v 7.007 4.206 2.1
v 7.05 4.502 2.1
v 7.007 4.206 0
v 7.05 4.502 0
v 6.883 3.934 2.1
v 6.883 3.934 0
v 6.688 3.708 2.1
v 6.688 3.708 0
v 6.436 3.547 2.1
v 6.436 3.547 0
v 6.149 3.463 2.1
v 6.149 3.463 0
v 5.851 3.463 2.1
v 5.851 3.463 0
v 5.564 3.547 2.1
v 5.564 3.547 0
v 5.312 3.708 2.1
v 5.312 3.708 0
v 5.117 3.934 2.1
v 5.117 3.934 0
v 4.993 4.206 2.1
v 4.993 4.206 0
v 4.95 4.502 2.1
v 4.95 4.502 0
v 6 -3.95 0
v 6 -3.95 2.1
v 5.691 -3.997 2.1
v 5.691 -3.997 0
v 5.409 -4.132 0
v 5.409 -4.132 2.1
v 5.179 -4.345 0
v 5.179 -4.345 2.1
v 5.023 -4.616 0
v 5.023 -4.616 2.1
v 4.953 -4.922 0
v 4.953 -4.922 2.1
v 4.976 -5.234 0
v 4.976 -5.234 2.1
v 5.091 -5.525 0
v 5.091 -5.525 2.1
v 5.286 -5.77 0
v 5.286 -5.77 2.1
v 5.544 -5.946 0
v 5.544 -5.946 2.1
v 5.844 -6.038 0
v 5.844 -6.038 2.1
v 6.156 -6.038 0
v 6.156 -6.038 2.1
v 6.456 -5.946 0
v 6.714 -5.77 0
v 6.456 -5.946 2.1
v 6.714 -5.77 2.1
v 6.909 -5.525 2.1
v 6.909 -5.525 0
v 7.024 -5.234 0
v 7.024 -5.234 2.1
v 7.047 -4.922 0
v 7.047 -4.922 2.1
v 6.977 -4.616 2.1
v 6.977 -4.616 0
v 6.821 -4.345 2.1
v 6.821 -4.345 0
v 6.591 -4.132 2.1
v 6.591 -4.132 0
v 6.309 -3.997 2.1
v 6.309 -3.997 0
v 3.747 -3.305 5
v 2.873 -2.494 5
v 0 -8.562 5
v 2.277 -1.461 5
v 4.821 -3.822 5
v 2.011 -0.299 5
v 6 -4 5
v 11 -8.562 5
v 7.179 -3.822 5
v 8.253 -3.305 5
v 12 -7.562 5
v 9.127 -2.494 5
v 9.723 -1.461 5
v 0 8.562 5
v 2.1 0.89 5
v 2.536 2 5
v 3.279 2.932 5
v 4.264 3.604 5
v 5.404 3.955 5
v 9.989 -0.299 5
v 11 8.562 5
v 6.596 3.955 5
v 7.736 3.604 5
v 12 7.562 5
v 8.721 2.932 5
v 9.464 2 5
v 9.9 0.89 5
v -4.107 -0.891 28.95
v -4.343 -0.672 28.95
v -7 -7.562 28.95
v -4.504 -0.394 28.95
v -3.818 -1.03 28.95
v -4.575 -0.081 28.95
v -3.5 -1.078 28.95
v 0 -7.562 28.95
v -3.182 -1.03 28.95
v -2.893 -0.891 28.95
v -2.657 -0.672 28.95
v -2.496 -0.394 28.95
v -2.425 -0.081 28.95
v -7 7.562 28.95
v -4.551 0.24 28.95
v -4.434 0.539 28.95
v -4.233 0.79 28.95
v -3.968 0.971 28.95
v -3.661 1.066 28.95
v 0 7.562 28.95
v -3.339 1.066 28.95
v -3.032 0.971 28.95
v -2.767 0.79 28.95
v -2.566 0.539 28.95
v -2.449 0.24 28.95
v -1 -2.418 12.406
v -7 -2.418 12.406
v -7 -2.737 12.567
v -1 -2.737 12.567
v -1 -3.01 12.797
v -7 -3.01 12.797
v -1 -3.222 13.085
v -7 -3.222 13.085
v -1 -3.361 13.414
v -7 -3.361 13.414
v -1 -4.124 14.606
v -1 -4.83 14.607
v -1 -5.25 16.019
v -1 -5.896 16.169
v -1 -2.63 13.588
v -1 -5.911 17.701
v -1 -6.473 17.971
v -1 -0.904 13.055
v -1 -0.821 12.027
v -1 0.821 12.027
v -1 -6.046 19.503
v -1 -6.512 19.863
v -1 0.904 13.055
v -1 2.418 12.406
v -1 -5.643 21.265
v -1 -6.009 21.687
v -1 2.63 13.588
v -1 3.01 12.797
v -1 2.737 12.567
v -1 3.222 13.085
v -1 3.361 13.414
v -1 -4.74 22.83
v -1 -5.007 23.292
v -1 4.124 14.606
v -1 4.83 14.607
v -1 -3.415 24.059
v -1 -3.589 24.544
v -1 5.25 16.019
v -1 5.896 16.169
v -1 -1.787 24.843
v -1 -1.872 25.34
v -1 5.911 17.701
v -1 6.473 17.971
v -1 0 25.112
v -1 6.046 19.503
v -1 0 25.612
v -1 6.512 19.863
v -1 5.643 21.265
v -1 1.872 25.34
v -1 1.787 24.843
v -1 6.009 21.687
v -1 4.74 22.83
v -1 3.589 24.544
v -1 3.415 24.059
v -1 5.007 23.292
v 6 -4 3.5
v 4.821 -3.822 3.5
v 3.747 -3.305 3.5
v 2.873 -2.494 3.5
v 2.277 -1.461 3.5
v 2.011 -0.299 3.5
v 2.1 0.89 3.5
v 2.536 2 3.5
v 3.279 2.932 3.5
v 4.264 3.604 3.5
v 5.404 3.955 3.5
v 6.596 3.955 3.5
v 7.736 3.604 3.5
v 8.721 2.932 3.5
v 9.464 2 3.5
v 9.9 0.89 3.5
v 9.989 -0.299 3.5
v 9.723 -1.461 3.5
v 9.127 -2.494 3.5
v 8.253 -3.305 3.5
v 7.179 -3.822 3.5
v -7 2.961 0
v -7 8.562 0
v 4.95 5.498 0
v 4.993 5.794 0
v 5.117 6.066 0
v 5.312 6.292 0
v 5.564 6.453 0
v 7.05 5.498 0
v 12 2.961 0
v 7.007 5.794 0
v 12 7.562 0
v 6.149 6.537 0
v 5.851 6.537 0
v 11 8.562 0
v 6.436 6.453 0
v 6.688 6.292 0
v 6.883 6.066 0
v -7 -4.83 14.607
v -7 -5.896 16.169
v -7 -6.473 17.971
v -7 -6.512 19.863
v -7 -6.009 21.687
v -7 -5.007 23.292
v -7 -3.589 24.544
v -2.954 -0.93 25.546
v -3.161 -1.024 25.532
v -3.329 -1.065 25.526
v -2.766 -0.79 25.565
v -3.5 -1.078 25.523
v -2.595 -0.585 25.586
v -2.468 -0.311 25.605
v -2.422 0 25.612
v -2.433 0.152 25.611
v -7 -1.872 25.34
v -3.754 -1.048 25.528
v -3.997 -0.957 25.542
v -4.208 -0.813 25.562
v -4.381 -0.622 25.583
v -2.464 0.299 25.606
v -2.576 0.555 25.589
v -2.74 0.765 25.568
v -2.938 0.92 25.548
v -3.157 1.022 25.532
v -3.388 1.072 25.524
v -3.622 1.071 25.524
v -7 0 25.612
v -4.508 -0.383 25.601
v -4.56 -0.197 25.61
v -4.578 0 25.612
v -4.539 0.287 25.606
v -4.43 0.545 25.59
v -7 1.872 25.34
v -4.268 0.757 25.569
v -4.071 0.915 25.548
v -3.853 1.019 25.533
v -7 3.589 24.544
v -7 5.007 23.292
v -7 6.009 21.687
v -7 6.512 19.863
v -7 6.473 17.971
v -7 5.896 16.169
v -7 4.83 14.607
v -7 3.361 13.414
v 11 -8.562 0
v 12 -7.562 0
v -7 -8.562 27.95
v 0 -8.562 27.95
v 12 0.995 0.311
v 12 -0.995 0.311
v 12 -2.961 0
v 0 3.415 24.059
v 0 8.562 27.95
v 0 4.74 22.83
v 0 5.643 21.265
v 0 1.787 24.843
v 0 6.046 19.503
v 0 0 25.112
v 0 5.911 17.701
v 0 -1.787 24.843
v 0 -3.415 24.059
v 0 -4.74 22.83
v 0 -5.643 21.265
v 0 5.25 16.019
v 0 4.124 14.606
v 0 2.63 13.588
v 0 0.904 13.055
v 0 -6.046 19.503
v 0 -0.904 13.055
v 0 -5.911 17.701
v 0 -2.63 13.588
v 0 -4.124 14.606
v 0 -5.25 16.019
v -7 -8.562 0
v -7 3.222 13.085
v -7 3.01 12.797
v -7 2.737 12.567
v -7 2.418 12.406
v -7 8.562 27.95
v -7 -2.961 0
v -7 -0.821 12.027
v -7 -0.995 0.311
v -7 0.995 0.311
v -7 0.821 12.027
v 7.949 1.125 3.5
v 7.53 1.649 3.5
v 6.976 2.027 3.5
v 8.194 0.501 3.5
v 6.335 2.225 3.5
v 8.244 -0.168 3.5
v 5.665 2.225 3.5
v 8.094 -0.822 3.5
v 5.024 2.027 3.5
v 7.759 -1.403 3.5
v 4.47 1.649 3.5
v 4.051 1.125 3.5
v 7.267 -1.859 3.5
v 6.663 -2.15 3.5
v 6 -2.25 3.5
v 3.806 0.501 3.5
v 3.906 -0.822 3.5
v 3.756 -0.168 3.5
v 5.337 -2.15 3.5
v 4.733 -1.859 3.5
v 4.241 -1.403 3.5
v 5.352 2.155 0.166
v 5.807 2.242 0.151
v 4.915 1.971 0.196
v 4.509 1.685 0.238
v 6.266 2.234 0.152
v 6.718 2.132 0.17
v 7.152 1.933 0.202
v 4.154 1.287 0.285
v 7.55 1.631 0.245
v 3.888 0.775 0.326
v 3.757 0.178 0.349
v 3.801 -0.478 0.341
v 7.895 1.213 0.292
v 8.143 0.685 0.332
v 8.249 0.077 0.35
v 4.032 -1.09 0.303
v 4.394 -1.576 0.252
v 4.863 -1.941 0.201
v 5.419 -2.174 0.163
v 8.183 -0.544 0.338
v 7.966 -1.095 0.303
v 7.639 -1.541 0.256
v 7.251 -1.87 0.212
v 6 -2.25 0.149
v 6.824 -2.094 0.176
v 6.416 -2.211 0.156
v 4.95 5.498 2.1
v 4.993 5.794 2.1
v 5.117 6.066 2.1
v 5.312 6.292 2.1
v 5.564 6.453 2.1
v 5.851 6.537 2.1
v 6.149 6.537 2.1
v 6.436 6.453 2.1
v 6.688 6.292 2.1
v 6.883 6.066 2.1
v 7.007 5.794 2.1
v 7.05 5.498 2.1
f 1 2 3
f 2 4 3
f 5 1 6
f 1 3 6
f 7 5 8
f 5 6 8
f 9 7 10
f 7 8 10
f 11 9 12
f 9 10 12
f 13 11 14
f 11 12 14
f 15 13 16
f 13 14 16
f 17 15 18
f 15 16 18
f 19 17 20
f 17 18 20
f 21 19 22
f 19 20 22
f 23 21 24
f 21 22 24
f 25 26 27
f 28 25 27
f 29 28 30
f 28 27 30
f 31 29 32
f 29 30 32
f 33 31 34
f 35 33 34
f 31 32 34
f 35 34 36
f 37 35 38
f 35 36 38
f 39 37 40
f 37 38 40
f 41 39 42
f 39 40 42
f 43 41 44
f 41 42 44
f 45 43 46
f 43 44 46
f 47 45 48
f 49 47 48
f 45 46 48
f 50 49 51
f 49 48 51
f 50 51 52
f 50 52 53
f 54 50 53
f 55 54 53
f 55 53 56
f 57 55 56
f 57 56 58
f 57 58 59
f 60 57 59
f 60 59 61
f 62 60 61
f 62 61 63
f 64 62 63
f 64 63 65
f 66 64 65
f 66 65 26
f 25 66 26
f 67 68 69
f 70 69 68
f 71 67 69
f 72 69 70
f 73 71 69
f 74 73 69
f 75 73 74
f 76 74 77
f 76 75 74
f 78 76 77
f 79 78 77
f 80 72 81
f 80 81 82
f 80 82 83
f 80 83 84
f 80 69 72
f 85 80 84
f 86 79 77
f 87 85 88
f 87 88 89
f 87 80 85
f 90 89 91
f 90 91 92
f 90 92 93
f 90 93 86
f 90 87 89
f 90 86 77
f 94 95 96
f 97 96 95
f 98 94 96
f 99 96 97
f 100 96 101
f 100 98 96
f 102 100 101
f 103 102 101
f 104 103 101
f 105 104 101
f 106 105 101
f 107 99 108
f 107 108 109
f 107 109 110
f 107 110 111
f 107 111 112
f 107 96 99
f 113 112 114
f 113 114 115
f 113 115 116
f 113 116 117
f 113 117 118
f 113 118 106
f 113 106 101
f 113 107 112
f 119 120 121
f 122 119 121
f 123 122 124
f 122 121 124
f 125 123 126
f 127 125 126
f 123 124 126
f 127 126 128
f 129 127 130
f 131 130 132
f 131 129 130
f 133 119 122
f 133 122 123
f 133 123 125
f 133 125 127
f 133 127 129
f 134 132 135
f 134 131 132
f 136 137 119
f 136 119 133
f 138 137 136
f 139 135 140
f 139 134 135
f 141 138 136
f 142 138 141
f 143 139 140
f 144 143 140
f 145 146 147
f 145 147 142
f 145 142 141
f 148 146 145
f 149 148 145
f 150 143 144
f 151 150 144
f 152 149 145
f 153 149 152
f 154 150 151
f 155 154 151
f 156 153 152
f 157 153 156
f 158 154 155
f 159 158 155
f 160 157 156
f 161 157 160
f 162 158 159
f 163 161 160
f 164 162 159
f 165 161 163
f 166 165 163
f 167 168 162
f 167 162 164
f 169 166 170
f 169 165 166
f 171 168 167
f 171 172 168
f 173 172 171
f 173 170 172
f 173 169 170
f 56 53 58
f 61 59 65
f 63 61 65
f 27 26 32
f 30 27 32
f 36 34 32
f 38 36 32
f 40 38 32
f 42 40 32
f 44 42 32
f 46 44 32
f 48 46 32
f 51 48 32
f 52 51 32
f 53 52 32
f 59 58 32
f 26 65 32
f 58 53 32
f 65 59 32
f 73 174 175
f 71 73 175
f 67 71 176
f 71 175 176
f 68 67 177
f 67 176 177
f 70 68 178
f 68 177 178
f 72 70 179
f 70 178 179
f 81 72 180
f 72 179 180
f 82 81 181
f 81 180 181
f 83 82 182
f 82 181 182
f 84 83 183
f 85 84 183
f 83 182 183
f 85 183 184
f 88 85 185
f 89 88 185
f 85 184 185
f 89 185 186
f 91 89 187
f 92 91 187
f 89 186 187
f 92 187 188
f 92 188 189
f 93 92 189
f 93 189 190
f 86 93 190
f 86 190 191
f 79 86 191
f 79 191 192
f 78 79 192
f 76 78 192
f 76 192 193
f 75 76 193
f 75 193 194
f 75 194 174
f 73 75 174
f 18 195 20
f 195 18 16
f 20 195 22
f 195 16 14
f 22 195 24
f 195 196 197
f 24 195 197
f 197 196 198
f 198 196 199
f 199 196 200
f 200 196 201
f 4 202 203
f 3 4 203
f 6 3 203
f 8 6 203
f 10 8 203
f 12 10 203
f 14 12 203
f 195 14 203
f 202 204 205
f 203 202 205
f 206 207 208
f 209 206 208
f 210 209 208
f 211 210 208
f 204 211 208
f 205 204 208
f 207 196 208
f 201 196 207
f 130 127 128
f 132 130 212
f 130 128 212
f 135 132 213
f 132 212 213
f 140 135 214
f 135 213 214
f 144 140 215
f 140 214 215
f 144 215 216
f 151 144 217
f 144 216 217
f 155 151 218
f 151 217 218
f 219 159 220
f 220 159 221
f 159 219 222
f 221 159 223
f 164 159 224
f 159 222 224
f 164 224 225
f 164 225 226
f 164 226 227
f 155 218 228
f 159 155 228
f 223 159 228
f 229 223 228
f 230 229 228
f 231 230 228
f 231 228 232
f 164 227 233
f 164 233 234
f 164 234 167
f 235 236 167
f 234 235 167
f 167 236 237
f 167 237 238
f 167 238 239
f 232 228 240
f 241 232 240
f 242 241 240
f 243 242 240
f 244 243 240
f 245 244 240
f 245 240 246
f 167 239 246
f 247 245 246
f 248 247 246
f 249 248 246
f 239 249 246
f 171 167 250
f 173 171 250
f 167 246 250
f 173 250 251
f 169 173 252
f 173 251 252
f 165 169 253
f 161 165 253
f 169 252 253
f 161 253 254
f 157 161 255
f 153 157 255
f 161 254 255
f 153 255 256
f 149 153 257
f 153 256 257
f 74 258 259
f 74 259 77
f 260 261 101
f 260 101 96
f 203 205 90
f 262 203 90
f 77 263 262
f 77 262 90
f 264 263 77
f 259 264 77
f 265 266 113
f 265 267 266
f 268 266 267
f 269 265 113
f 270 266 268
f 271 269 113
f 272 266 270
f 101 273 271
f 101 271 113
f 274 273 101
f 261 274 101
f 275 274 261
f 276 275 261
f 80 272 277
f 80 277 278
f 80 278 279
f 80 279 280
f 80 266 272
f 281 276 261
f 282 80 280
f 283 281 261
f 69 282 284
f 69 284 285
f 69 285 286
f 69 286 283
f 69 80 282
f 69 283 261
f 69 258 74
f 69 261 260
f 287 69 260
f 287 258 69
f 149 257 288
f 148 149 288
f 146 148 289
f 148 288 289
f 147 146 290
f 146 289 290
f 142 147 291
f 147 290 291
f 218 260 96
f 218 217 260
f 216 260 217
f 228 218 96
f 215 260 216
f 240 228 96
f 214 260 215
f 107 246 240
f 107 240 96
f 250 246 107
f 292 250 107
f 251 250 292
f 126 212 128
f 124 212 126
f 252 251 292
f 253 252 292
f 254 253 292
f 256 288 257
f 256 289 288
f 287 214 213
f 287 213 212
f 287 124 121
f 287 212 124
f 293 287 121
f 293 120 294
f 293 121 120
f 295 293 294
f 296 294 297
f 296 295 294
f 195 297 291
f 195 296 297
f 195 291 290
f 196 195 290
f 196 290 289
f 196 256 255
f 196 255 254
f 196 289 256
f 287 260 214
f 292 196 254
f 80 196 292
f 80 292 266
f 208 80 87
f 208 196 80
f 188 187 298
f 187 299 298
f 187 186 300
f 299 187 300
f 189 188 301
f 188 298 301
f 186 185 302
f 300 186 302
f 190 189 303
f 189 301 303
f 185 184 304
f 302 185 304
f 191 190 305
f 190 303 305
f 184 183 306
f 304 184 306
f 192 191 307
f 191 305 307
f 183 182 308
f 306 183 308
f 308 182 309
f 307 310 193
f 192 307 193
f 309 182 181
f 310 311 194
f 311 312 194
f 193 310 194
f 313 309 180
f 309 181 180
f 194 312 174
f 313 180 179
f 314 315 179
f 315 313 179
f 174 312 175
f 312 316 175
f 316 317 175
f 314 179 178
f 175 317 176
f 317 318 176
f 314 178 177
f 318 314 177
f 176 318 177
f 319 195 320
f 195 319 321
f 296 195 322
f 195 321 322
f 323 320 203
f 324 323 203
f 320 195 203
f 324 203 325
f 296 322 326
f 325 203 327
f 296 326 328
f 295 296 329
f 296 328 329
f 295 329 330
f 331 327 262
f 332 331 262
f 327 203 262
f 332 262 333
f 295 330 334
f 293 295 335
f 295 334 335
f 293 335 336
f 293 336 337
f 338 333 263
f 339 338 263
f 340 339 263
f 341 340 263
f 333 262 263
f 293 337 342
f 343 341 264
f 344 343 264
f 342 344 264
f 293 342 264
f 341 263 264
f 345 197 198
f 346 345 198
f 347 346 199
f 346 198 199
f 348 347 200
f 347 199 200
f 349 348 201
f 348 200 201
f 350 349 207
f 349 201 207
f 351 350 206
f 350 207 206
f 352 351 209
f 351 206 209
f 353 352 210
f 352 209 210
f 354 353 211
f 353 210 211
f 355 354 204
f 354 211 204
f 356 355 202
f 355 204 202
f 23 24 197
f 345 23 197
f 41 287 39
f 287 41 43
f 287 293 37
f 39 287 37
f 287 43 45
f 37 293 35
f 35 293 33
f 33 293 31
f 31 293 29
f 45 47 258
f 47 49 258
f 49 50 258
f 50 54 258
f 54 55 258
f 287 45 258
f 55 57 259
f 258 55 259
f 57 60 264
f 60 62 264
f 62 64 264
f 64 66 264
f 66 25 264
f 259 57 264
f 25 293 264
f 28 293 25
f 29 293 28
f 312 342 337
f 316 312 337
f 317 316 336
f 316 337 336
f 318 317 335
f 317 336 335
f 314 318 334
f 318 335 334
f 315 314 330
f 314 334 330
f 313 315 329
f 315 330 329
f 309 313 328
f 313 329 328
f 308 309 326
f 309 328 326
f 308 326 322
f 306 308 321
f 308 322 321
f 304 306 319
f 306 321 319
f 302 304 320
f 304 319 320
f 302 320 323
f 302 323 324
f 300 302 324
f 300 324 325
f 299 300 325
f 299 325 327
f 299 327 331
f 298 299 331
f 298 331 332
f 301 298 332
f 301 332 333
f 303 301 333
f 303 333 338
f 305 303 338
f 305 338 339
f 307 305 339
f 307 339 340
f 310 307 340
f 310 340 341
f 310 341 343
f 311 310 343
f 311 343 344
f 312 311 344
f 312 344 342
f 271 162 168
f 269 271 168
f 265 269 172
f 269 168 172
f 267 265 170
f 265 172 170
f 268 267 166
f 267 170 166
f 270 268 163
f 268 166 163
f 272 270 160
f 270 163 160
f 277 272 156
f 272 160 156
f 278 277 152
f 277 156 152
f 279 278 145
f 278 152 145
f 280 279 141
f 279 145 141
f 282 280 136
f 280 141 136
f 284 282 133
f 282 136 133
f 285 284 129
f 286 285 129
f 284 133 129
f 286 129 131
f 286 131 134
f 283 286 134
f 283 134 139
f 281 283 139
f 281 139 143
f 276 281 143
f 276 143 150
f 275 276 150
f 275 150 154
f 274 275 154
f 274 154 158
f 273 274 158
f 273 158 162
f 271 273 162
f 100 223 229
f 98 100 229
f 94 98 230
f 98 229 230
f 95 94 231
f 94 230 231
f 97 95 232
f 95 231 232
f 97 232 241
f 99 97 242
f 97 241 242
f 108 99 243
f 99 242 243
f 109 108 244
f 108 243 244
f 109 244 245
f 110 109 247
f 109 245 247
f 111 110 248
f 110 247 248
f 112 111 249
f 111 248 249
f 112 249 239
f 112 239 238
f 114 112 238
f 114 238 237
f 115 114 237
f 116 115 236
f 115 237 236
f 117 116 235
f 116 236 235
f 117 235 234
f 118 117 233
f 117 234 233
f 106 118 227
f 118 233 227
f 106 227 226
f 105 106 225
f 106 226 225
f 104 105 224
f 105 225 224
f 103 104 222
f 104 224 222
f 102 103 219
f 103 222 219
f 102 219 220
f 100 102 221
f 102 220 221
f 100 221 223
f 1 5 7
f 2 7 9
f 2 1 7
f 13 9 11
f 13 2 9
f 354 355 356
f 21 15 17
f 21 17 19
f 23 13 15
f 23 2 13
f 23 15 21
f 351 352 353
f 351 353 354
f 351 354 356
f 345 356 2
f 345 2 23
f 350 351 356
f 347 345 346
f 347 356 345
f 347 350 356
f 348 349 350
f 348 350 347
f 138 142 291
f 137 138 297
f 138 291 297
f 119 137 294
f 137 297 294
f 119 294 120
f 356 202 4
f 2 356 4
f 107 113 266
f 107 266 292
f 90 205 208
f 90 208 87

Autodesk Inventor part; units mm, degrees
ref_plane "YZ Plane" through (0, 0, 0) normal (1, 0, 0) x (0, 1, 0)
ref_plane "XZ Plane" through (0, 0, 0) normal (0, 1, 0) x (-1, 0, 0)
ref_plane "XY Plane" through (0, 0, 0) normal (0, 0, 1) x (1, 0, 0)
sketch "Sketch1" plane through (0, 0, 0) normal (0, 0, 1) x (1, 0, 0)
  line L0 (-7, 8.5625) -> (0, 8.5625)
  line L1 (0, 8.5625) -> (0, -8.5625)
  line L2 (0, -8.5625) -> (-7, -8.5625)
  line L3 (-7, -8.5625) -> (-7, 8.5625)
  point P0 (0, 0)
  dimension "d0" = 0
  dimension "FRONT_LENGTH" = 7
  dimension "WIDTH" = 17.125
  dimension "d3" = 8.5625
extrude "Extrusion1" add sketch "Sketch1" along normal blind 28.95
sketch "Sketch2" plane through (0, 0, 0) normal (0, 0, 1) x (1, 0, 0)
  line L0 (0, -8.5625) -> (0, 8.5625) projected
  line L1 (0, 8.5625) -> (12, 8.5625)
  line L2 (12, 8.5625) -> (12, -8.5625)
  line L3 (12, -8.5625) -> (0, -8.5625)
  line L4 (0, -8.5625) -> (0, 8.5625)
  point P0 (0, 0)
  point P1 (0, -8.5625)
  dimension "d6" = 17.125
  dimension "BACK_LENGTH" = 12
sketch "Sketch3" plane through (-7, -8.5625, 0) normal (-1, 0, 0) x (0, 0, 1)
  circle A0 centre (19.05, 8.5625) radius 6.5625
  circle A1 centre (19.05, 8.5625) radius 7.0705
  circle A2 centre (13.8389, 10.4592) radius 1.525
  circle A3 centre (13.8389, 6.6658) radius 1.525
  line L0 (13.8389, 10.4592) -> (19.05, 8.5625)
  line L1 (19.05, 8.5625) -> (13.8389, 6.6658)
  line L2 (19.05, 8.5625) -> (0, 8.5625)
  point P0 (12.4059, 6.1442)
  point P1 (13.4136, 5.2013)
  point P2 (13.4136, 11.9237)
  point P3 (12.4059, 10.9808)
  dimension "d8" = 0
  dimension "MIRROR_HOLE" = 13.125
  dimension "d10" = 14.141
  dimension "d11" = 3.05
  dimension "d12" = 3.05
  dimension "d13" = 19.05
  dimension "d14" = 20
  dimension "d15" = 20
  dimension "d16" = 0
  dimension "d17" = 0
extrude "Extrusion2" cut sketch "Sketch3" against normal blind 6 contours A0 A3 L1 L0 A2 | A2 A0 | A0 A2 | A3 A0 | A0 A3 | A2 L0 L2 A0 | A0 L2 A1 A2 | A3 A1 L2 A0 | A0 L2 L1 A3
sketch "Sketch5" plane through (-1, -8.5625, 0) normal (-1, 0, 0) x (0, 0, 1)
  circle A0 centre (19.05, 8.5625) radius 6.0625
  point P0 (0, 8.5625)
  dimension "d20" = 0
  dimension "d21" = 19.05
  dimension "d22" = 12.125
extrude "Extrusion3" cut sketch "Sketch5" against normal up to surface (1 mm away)
extrude "Extrusion4" add sketch "Sketch2" along normal blind 5
sketch "Sketch6" plane through (0, 0, 5) normal (0, 0, 1) x (1, 0, 0)
  point P0 (0, 0)
  point P1 (6, 0)
  dimension "d27" = 0
  dimension "d28" = 6
hole "Hole1" at (6, 0, 5) direction (0, 0, -1) diameter 4.5 depth 5 counterbore diameter 8 counterbore depth 1.5 clearance for "Socket Head Cap Screw" size "#8" standard "Ansi Unified Screw Threads"
sketch "Sketch7" plane through (0, 0, 0) normal (0, 0, -1) x (-1, 0, 0)
  circle A0 centre (-6, 0) radius 2.25 projected
  line L0 (-6, 5.498) -> (-6, 4.502) construction
  line L1 (-7.05, 5.498) -> (-7.05, 4.502)
  line L2 (-4.95, 4.502) -> (-4.95, 5.498)
  arc A1 (-4.95, 5.498) -> (-7.05, 5.498) centre (-6, 5.498) ccw
  arc A2 (-7.05, 4.502) -> (-4.95, 4.502) centre (-6, 4.502) ccw
  point P0 (0, 0)
  point P1 (-6, -5)
  point P2 (-6, 5)
  dimension "d36" = 0
  dimension "d37" = 0
  dimension "d38" = 5
  dimension "d39" = 5
  dimension "d63" = 1.05
  dimension "d64" = 0.996
hole "Hole2" at (6, -5, 0) direction (0, 0, 1) diameter 2.1 depth 2.1
sketch "Sketch8" plane through (0, 0, 28.95) normal (0, 0, 1) x (1, 0, 0)
  point P0 (0, 0)
  point P1 (-3.5, 0)
  dimension "d47" = 3.5
  dimension "d48" = 0
hole "Hole4" at (-3.5, 0, 28.95) direction (0, 0, -1) diameter 2.1565 end up to surface thread size "4-40 UNC" class "3B" standard "ANSI Unified Screw Threads"
extrude "Extrusion5" cut sketch "Sketch7" against normal blind 2.1 contours A1 L2 A2 L1
chamfer "Chamfer1" distance 1 angle 45 4 edges at (-3.5, -8.5625, 28.95) (-3.5, 8.5625, 28.95) (12, -8.5625, 2.5) (12, 8.5625, 2.5)
sketch "Sketch9" plane through (12, -7.5625, 0) normal (1, 0, 0) x (0, 0, -1)
  circle A0 centre (12.35, 7.5625) radius 12.7
  point P0 (0, 7.5625)
  dimension "d70" = 0
  dimension "d71" = 25.4
  dimension "d72" = 12.35
extrude "Extrusion6" cut sketch "Sketch9" against normal up to surface (19 mm away)
equation "\"WIDTH\" = MIRROR_HOLE + 2 * MIN_WALL_THICKNESS"
equation "\"d3\" = 0.5 * WIDTH"
equation "\"d13\" = BEAM_HEIGHT"
equation "\"d6\" = WIDTH"
equation "\"d21\" = BEAM_HEIGHT"
equation "\"d28\" = 0.5 * BACK_LENGTH"
equation "\"d39\" = d38"
equation "\"d47\" = 0.5 * FRONT_LENGTH"
equation "\"BEAM_HEIGHT\" = 19.05"
equation "\"MIN_WALL_THICKNESS\" = 2"
equation "\"OPTICS_DIAMETER\" = 12.7"
equation "\"TOLERANCE\" = 0.05"
properties part number "ADAPTER_fixed-mirror-BH19.05-D12.7"
